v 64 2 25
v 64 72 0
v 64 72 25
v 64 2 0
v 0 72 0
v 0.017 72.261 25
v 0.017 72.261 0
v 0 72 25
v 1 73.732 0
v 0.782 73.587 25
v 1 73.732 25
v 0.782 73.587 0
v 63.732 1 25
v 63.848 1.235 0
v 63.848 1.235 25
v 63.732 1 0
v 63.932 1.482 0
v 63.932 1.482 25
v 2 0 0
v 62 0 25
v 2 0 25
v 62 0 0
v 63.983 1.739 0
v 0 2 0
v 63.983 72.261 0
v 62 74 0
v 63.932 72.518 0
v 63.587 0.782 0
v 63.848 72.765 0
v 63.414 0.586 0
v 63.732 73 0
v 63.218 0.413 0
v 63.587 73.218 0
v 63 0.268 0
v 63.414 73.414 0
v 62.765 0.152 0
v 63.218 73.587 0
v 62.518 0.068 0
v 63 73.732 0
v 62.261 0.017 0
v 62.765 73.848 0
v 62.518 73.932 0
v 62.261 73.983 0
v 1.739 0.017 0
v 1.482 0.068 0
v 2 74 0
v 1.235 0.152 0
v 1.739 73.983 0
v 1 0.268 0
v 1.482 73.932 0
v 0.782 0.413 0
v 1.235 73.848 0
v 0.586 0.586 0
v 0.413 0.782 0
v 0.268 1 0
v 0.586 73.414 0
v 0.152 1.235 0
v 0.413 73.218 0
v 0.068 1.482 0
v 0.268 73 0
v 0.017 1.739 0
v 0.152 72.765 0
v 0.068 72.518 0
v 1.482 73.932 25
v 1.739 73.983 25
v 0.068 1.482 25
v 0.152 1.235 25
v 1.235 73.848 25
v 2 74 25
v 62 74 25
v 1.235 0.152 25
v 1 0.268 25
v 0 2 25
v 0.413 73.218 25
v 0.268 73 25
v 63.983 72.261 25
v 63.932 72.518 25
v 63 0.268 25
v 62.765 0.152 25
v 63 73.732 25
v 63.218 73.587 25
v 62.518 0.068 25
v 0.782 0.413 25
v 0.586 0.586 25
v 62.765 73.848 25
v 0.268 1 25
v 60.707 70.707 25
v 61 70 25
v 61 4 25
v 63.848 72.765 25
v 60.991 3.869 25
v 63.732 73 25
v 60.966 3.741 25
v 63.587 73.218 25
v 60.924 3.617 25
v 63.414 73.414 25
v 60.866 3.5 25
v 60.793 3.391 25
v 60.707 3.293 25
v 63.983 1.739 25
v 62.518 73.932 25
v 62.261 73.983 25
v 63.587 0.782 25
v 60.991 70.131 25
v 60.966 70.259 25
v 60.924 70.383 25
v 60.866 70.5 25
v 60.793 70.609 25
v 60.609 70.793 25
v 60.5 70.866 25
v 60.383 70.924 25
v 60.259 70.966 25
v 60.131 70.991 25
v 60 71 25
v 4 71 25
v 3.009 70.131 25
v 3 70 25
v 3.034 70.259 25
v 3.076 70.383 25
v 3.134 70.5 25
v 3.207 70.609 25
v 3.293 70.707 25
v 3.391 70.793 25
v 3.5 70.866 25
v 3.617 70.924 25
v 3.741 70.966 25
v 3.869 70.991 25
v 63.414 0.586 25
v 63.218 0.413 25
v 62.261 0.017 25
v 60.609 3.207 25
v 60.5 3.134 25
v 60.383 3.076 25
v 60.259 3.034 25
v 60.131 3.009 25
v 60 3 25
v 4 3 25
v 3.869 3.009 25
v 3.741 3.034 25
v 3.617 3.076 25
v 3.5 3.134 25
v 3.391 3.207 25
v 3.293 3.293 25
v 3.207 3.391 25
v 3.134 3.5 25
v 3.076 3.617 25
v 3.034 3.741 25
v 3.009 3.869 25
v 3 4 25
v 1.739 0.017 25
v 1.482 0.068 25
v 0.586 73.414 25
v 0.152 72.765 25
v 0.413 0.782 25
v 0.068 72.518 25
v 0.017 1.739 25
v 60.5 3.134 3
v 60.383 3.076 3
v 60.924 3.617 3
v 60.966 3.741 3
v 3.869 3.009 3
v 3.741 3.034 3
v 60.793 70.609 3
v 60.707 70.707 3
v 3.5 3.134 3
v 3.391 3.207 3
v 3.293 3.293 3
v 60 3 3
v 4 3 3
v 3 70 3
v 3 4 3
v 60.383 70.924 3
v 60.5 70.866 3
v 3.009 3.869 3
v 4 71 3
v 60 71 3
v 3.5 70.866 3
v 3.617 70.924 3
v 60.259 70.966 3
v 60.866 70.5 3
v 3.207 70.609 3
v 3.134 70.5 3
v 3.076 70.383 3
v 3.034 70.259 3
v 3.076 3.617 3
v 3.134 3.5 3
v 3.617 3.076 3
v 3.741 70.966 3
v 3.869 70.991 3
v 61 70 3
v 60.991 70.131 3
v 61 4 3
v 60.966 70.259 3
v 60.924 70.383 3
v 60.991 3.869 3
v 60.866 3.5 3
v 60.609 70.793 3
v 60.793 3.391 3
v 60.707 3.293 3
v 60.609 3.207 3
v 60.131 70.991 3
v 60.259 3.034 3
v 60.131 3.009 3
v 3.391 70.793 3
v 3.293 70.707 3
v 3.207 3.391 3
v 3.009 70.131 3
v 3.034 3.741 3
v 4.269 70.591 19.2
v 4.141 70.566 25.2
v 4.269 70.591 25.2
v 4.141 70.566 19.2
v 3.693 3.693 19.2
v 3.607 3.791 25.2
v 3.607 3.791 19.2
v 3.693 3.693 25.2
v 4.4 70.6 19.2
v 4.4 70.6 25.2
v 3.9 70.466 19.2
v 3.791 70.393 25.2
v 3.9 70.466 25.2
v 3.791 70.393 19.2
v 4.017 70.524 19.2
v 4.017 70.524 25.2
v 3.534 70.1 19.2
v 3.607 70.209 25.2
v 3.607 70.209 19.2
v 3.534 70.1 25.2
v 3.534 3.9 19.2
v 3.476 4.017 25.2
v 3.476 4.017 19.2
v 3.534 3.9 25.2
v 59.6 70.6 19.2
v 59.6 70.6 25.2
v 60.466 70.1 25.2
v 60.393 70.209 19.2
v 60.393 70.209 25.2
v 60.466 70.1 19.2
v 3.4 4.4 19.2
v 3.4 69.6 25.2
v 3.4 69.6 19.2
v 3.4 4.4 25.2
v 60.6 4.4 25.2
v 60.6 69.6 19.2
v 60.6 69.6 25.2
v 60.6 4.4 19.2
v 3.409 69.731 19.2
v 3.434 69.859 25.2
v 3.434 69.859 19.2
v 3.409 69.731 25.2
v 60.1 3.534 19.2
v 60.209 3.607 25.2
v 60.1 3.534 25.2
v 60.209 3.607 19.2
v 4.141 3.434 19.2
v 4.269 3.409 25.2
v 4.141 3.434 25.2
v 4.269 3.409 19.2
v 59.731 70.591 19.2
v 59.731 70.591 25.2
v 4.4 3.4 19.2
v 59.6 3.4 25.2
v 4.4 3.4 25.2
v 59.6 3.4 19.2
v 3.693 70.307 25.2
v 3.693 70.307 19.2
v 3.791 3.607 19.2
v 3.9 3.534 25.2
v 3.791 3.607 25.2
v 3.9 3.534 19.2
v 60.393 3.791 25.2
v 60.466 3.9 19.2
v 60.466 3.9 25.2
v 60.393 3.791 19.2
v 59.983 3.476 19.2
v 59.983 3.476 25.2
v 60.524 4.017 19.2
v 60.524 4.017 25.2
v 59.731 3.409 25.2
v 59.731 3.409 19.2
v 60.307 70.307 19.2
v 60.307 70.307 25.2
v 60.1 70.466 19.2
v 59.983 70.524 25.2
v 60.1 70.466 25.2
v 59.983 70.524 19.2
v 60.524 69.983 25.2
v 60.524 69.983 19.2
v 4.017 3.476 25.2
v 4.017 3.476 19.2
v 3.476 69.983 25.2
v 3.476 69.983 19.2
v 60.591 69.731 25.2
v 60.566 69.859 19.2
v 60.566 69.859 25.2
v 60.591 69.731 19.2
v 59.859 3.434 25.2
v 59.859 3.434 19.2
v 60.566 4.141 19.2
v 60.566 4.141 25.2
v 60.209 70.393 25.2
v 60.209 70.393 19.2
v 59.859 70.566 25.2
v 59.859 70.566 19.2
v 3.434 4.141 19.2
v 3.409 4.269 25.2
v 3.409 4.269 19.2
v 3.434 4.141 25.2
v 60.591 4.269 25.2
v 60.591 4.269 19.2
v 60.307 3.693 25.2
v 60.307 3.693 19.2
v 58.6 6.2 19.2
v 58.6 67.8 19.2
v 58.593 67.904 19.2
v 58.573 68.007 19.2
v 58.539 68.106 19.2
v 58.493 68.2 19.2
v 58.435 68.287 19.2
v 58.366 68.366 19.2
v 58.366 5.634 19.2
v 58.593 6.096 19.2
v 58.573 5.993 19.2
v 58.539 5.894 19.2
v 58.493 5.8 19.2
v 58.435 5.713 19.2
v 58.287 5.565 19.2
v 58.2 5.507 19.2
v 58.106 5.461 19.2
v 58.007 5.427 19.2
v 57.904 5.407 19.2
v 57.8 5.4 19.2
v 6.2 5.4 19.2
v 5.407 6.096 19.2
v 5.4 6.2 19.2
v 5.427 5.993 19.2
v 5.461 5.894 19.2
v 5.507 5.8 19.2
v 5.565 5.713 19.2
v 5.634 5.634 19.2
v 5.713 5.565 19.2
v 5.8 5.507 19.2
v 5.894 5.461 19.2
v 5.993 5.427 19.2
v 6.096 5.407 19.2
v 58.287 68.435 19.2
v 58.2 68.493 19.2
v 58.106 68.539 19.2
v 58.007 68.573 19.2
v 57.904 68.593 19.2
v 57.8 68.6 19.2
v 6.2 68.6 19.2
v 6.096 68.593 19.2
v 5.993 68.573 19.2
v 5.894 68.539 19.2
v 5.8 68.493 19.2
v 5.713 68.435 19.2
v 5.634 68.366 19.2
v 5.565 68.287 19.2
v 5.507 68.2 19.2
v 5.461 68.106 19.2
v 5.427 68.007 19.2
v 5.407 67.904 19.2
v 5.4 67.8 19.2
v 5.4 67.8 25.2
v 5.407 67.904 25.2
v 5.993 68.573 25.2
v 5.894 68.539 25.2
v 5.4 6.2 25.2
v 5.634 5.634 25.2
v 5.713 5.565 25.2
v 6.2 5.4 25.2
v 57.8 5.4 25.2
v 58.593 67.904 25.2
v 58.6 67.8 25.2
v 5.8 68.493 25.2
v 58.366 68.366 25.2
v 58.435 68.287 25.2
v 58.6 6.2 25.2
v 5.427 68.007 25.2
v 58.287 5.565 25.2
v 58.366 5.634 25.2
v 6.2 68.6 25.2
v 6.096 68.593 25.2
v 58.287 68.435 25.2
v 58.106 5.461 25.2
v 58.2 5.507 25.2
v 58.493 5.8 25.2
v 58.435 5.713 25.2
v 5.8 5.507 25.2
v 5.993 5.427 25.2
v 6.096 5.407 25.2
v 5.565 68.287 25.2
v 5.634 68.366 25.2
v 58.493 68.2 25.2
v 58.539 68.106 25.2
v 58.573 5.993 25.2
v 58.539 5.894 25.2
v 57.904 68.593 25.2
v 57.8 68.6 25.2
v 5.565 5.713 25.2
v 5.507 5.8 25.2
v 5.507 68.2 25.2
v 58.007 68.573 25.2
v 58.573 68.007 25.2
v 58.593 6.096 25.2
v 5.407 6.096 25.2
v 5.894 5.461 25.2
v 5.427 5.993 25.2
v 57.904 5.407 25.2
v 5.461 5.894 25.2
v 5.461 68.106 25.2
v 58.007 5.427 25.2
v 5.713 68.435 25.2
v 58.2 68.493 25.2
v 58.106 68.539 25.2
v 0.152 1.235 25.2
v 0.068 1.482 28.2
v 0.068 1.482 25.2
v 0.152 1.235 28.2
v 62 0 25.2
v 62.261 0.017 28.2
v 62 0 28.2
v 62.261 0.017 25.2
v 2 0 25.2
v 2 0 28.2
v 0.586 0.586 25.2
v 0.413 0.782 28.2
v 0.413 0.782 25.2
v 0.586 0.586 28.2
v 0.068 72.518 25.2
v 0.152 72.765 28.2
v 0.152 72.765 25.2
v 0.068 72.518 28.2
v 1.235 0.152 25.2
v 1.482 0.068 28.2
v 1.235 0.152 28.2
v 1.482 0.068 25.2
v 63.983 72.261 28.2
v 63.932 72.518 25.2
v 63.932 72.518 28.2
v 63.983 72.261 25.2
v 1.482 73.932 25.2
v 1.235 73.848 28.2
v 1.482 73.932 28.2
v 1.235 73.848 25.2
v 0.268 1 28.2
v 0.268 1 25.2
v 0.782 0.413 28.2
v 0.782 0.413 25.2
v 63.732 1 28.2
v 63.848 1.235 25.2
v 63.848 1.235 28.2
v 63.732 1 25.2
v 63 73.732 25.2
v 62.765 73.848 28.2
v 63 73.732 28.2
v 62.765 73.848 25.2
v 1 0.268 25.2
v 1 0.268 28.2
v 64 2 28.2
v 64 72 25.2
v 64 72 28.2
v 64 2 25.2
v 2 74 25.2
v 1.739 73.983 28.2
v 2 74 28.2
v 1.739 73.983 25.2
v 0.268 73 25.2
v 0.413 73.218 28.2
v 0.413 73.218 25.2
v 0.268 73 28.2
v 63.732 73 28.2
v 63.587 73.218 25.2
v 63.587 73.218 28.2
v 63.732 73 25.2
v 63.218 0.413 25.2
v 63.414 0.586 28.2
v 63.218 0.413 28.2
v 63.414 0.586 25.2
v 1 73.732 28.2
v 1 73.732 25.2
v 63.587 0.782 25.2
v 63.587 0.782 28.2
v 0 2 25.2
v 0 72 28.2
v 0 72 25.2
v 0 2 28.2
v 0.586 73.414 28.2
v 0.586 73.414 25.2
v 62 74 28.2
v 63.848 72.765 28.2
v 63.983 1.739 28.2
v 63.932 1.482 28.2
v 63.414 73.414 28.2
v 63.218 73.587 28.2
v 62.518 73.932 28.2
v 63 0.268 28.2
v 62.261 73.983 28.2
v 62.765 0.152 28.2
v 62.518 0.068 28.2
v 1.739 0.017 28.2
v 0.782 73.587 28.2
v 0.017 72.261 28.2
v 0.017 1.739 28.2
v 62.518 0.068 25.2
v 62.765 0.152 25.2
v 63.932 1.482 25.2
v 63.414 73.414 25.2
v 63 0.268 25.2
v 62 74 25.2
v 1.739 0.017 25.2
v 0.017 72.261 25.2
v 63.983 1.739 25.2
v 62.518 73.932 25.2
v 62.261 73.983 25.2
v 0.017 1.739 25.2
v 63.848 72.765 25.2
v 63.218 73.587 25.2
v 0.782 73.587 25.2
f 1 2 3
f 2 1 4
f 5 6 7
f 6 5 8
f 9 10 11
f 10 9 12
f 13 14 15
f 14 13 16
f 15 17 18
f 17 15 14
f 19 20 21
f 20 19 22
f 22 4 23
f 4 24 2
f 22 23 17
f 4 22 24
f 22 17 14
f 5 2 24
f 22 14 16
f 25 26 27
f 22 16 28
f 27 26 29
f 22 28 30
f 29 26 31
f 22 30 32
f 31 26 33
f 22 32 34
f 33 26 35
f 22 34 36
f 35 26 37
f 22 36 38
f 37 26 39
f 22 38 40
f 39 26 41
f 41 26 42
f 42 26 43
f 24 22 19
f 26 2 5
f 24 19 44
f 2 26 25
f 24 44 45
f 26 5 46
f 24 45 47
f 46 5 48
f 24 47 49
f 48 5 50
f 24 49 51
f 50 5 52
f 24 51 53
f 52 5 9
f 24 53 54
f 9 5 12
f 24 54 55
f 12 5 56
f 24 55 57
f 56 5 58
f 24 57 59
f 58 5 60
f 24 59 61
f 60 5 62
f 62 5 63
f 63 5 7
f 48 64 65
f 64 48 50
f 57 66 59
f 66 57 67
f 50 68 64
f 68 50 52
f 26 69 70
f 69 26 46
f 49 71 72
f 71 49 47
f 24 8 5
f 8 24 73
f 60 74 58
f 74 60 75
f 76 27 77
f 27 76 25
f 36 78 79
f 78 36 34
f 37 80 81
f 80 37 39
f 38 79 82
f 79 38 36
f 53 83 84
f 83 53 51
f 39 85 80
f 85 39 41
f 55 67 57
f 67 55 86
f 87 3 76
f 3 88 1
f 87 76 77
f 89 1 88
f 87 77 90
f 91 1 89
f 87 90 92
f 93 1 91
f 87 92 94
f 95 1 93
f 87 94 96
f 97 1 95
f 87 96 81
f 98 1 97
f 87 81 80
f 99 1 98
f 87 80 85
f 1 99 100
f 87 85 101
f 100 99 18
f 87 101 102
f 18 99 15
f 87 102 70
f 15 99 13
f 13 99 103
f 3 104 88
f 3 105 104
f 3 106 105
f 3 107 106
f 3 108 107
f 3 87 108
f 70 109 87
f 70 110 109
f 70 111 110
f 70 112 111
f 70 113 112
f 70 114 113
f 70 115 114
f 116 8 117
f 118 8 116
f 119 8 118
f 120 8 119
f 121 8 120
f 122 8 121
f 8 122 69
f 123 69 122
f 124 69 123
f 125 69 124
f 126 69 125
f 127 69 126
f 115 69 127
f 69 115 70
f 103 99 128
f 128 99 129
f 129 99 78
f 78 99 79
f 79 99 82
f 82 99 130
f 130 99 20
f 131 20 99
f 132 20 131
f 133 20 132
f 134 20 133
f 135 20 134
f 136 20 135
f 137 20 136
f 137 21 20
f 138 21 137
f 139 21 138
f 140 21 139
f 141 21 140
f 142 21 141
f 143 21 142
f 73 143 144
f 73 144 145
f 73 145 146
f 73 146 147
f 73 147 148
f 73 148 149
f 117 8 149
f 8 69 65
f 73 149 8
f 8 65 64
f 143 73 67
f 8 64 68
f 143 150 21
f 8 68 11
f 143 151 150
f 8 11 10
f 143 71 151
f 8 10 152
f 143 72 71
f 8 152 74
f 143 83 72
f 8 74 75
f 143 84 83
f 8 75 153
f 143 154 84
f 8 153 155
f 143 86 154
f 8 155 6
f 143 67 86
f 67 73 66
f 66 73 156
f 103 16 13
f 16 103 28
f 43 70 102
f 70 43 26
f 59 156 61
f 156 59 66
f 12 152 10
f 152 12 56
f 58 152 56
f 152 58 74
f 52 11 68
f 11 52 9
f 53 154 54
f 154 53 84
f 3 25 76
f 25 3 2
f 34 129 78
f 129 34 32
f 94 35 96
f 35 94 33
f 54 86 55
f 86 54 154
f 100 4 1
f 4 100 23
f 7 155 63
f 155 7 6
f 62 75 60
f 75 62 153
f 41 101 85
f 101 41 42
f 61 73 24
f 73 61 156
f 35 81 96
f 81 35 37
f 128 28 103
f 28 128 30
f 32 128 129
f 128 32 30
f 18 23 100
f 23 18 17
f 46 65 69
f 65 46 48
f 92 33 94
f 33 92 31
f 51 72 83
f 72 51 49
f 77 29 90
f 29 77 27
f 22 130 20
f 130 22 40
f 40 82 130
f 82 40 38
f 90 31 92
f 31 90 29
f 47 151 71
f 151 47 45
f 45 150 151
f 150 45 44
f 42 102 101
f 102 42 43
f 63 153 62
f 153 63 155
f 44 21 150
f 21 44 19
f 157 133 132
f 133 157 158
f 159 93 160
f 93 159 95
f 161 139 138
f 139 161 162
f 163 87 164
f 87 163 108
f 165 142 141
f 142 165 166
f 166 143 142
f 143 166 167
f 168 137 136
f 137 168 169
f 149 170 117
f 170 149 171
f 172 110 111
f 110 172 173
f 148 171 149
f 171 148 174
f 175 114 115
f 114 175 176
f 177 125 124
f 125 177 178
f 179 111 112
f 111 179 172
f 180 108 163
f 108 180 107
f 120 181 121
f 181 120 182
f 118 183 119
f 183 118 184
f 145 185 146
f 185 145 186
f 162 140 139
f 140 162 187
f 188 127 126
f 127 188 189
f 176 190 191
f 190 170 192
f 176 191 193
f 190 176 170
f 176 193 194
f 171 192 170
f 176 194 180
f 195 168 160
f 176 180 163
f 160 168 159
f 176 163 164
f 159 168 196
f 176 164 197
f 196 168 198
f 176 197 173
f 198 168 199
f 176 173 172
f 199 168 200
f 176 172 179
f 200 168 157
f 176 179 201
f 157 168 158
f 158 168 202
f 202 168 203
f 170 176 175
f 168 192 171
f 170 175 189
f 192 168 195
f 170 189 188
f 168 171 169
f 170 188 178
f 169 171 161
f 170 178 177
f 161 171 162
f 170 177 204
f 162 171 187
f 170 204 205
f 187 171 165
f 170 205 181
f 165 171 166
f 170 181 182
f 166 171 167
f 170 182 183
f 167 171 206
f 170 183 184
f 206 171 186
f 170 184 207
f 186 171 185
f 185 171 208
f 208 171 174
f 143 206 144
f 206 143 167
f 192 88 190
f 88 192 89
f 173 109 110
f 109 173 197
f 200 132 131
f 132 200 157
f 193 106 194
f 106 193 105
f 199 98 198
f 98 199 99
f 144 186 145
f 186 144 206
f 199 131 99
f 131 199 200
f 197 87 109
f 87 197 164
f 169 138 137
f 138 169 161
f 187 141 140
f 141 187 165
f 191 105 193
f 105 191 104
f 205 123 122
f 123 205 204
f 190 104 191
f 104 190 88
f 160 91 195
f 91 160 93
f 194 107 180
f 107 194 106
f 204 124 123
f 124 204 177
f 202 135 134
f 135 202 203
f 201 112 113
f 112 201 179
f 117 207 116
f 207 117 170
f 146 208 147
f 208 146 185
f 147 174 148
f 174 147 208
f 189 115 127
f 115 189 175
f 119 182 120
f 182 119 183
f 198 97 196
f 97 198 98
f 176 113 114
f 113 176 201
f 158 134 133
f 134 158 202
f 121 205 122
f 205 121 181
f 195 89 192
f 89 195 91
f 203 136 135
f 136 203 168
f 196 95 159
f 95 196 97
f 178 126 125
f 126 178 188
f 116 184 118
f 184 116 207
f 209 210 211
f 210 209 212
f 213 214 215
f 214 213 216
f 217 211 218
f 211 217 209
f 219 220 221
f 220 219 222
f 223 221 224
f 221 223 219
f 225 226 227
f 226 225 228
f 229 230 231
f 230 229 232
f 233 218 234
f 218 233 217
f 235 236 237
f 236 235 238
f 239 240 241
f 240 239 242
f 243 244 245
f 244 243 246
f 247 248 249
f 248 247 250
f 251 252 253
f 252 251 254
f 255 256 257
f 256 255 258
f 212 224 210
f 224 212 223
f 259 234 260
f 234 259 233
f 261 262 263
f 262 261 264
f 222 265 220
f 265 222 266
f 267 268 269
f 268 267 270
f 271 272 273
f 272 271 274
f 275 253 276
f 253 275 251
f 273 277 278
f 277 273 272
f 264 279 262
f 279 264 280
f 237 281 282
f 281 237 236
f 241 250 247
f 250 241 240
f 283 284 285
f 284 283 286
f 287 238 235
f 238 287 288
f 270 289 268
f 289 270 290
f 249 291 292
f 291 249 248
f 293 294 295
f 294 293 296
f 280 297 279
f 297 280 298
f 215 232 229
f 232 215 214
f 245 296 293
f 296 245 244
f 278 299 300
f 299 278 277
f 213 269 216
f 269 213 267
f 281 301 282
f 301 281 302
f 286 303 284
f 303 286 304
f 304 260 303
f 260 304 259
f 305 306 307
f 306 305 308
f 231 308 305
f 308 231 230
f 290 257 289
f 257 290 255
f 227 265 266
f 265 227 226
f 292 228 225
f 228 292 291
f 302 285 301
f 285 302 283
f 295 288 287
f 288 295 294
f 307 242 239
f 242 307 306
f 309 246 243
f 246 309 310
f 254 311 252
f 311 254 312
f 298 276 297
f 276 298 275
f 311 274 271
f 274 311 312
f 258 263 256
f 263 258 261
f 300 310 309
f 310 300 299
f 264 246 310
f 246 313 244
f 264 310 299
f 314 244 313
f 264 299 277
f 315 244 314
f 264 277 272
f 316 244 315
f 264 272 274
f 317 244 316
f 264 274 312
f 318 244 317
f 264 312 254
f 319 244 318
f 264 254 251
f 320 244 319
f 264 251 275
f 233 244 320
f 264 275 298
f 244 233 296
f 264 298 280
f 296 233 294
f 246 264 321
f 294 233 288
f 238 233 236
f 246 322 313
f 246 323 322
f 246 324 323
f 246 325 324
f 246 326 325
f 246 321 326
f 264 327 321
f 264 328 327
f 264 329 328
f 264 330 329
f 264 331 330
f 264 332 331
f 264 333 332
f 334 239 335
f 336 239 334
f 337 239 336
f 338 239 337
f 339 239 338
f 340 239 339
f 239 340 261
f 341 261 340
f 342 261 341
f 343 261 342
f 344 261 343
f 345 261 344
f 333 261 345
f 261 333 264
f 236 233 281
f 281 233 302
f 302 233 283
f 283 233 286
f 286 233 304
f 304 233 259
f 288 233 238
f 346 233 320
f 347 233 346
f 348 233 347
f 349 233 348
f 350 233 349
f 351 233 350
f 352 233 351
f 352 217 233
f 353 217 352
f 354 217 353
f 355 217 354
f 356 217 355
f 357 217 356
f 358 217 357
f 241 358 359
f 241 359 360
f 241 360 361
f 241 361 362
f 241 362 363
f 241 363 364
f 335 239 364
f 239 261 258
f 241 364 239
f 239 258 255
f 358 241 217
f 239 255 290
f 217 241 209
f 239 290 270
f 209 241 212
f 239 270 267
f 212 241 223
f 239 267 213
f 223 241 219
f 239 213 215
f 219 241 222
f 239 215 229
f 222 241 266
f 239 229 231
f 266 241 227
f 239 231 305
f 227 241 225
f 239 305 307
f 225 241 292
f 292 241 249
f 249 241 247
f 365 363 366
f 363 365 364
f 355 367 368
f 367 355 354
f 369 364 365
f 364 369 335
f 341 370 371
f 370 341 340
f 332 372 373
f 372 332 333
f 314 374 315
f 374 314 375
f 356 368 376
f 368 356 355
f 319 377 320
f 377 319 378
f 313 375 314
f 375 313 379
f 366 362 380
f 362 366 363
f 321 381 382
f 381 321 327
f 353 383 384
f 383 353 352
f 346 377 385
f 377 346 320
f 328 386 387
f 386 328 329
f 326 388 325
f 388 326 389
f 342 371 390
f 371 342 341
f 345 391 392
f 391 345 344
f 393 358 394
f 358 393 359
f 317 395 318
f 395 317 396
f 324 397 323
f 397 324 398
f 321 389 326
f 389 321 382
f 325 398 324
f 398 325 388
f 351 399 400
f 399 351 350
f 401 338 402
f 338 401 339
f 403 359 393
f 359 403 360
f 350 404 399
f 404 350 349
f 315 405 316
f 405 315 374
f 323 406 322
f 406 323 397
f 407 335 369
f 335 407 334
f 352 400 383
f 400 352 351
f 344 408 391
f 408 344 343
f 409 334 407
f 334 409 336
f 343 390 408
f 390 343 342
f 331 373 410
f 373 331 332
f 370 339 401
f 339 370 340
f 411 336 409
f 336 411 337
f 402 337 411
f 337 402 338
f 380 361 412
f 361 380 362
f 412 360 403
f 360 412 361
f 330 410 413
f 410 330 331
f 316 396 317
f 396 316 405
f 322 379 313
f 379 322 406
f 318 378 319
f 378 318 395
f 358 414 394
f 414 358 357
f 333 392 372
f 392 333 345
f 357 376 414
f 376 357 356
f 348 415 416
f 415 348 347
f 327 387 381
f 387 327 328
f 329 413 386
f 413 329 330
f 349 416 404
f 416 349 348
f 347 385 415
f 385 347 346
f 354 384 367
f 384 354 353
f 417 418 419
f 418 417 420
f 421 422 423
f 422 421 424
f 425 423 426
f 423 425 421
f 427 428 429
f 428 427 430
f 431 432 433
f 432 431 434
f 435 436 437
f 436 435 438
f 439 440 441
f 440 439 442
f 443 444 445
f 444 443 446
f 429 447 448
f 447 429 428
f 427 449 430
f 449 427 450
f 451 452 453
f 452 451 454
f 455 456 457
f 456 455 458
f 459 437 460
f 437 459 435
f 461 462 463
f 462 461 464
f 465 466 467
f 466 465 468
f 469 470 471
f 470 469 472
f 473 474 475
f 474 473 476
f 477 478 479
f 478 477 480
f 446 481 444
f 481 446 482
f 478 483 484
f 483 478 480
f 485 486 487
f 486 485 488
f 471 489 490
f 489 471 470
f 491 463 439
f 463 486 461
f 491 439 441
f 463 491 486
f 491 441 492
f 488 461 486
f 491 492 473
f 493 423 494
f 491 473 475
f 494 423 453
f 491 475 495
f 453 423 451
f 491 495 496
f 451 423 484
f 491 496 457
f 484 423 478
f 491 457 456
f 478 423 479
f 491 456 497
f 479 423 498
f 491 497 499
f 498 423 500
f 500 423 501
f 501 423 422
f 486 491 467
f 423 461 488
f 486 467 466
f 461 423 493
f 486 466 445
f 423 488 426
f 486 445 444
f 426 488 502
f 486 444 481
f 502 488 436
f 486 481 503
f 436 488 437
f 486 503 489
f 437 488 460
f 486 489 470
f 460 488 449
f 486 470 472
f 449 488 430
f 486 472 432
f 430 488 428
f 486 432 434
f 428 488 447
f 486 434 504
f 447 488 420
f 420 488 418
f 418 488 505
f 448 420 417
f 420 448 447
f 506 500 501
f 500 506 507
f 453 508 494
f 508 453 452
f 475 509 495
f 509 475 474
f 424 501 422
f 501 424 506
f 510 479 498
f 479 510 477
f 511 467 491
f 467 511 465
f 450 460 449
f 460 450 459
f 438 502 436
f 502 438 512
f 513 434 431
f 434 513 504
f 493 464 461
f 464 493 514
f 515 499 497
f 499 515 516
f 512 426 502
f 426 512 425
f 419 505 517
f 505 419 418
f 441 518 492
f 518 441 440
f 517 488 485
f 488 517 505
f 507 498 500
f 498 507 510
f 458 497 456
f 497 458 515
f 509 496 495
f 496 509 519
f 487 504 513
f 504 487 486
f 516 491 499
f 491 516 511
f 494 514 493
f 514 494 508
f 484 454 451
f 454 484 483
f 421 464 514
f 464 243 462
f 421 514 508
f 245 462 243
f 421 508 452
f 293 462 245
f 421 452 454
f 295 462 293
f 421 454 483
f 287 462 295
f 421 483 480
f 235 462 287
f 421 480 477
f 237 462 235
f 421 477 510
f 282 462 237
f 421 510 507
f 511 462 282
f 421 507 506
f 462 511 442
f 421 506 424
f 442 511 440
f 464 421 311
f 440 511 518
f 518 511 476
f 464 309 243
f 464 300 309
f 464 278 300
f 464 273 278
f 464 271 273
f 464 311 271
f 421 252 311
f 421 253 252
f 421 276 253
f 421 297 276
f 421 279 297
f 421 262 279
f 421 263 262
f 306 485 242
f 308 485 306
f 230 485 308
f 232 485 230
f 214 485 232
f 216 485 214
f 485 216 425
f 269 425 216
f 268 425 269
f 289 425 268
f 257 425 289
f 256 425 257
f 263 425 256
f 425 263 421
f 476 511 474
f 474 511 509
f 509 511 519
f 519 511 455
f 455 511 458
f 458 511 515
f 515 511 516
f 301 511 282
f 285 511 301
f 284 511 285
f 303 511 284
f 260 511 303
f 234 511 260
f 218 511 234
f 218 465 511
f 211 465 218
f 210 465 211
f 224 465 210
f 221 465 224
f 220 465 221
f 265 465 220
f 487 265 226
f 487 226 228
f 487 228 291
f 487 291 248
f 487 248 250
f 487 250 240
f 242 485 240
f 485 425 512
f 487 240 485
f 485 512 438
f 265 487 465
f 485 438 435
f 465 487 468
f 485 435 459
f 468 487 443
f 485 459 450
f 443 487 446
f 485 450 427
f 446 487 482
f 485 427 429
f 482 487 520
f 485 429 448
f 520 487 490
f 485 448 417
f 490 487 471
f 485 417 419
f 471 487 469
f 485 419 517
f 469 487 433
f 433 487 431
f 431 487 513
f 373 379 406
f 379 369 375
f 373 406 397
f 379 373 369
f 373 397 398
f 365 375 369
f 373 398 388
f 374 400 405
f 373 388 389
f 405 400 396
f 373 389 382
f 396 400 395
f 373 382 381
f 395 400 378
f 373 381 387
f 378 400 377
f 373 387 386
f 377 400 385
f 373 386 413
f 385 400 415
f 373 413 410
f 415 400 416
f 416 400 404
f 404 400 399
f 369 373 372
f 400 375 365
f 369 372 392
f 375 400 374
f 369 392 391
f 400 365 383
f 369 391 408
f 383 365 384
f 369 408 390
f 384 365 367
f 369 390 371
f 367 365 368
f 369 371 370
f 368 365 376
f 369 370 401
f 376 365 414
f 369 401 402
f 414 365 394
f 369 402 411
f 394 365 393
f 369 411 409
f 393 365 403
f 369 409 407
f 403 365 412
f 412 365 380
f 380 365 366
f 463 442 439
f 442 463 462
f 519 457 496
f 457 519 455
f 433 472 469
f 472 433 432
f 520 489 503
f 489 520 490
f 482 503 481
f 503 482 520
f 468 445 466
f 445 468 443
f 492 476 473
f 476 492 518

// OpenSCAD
$fn = 48;

// Units: mm
wall = 3.0;
clearance = 0.4;
vertical_clearance = 0.2;

cavity_x = 58;
cavity_y = 68;
cavity_z = 22;

bottom_thickness = wall;
base_outer_x = cavity_x + 2 * wall;
base_outer_y = cavity_y + 2 * wall;
base_height = bottom_thickness + cavity_z;

lid_thickness = wall;
lid_lip_wall = 2.0;
lid_lip_depth = 6.0;

lid_z = base_height + vertical_clearance;

module rounded_box(size, r) {
    x = size[0];
    y = size[1];
    z = size[2];

    hull() {
        translate([ r,     r,     0]) cylinder(h = z, r = r);
        translate([ x - r, r,     0]) cylinder(h = z, r = r);
        translate([ r,     y - r, 0]) cylinder(h = z, r = r);
        translate([ x - r, y - r, 0]) cylinder(h = z, r = r);
    }
}

module base() {
    difference() {
        rounded_box([base_outer_x, base_outer_y, base_height], 2.0);

        translate([wall, wall, bottom_thickness])
            rounded_box([cavity_x, cavity_y, cavity_z + 0.2], 1.0);
    }
}

module lid() {
    lip_outer_x = cavity_x - 2 * clearance;
    lip_outer_y = cavity_y - 2 * clearance;
    lip_inner_x = lip_outer_x - 2 * lid_lip_wall;
    lip_inner_y = lip_outer_y - 2 * lid_lip_wall;

    union() {
        translate([0, 0, lid_z])
            rounded_box([base_outer_x, base_outer_y, lid_thickness], 2.0);

        translate([
            wall + clearance,
            wall + clearance,
            lid_z - lid_lip_depth
        ])
            difference() {
                rounded_box([lip_outer_x, lip_outer_y, lid_lip_depth], 1.0);

                translate([lid_lip_wall, lid_lip_wall, -0.1])
                    rounded_box([
                        lip_inner_x,
                        lip_inner_y,
                        lid_lip_depth + 0.2
                    ], 0.8);
            }
    }
}

base();
lid();
